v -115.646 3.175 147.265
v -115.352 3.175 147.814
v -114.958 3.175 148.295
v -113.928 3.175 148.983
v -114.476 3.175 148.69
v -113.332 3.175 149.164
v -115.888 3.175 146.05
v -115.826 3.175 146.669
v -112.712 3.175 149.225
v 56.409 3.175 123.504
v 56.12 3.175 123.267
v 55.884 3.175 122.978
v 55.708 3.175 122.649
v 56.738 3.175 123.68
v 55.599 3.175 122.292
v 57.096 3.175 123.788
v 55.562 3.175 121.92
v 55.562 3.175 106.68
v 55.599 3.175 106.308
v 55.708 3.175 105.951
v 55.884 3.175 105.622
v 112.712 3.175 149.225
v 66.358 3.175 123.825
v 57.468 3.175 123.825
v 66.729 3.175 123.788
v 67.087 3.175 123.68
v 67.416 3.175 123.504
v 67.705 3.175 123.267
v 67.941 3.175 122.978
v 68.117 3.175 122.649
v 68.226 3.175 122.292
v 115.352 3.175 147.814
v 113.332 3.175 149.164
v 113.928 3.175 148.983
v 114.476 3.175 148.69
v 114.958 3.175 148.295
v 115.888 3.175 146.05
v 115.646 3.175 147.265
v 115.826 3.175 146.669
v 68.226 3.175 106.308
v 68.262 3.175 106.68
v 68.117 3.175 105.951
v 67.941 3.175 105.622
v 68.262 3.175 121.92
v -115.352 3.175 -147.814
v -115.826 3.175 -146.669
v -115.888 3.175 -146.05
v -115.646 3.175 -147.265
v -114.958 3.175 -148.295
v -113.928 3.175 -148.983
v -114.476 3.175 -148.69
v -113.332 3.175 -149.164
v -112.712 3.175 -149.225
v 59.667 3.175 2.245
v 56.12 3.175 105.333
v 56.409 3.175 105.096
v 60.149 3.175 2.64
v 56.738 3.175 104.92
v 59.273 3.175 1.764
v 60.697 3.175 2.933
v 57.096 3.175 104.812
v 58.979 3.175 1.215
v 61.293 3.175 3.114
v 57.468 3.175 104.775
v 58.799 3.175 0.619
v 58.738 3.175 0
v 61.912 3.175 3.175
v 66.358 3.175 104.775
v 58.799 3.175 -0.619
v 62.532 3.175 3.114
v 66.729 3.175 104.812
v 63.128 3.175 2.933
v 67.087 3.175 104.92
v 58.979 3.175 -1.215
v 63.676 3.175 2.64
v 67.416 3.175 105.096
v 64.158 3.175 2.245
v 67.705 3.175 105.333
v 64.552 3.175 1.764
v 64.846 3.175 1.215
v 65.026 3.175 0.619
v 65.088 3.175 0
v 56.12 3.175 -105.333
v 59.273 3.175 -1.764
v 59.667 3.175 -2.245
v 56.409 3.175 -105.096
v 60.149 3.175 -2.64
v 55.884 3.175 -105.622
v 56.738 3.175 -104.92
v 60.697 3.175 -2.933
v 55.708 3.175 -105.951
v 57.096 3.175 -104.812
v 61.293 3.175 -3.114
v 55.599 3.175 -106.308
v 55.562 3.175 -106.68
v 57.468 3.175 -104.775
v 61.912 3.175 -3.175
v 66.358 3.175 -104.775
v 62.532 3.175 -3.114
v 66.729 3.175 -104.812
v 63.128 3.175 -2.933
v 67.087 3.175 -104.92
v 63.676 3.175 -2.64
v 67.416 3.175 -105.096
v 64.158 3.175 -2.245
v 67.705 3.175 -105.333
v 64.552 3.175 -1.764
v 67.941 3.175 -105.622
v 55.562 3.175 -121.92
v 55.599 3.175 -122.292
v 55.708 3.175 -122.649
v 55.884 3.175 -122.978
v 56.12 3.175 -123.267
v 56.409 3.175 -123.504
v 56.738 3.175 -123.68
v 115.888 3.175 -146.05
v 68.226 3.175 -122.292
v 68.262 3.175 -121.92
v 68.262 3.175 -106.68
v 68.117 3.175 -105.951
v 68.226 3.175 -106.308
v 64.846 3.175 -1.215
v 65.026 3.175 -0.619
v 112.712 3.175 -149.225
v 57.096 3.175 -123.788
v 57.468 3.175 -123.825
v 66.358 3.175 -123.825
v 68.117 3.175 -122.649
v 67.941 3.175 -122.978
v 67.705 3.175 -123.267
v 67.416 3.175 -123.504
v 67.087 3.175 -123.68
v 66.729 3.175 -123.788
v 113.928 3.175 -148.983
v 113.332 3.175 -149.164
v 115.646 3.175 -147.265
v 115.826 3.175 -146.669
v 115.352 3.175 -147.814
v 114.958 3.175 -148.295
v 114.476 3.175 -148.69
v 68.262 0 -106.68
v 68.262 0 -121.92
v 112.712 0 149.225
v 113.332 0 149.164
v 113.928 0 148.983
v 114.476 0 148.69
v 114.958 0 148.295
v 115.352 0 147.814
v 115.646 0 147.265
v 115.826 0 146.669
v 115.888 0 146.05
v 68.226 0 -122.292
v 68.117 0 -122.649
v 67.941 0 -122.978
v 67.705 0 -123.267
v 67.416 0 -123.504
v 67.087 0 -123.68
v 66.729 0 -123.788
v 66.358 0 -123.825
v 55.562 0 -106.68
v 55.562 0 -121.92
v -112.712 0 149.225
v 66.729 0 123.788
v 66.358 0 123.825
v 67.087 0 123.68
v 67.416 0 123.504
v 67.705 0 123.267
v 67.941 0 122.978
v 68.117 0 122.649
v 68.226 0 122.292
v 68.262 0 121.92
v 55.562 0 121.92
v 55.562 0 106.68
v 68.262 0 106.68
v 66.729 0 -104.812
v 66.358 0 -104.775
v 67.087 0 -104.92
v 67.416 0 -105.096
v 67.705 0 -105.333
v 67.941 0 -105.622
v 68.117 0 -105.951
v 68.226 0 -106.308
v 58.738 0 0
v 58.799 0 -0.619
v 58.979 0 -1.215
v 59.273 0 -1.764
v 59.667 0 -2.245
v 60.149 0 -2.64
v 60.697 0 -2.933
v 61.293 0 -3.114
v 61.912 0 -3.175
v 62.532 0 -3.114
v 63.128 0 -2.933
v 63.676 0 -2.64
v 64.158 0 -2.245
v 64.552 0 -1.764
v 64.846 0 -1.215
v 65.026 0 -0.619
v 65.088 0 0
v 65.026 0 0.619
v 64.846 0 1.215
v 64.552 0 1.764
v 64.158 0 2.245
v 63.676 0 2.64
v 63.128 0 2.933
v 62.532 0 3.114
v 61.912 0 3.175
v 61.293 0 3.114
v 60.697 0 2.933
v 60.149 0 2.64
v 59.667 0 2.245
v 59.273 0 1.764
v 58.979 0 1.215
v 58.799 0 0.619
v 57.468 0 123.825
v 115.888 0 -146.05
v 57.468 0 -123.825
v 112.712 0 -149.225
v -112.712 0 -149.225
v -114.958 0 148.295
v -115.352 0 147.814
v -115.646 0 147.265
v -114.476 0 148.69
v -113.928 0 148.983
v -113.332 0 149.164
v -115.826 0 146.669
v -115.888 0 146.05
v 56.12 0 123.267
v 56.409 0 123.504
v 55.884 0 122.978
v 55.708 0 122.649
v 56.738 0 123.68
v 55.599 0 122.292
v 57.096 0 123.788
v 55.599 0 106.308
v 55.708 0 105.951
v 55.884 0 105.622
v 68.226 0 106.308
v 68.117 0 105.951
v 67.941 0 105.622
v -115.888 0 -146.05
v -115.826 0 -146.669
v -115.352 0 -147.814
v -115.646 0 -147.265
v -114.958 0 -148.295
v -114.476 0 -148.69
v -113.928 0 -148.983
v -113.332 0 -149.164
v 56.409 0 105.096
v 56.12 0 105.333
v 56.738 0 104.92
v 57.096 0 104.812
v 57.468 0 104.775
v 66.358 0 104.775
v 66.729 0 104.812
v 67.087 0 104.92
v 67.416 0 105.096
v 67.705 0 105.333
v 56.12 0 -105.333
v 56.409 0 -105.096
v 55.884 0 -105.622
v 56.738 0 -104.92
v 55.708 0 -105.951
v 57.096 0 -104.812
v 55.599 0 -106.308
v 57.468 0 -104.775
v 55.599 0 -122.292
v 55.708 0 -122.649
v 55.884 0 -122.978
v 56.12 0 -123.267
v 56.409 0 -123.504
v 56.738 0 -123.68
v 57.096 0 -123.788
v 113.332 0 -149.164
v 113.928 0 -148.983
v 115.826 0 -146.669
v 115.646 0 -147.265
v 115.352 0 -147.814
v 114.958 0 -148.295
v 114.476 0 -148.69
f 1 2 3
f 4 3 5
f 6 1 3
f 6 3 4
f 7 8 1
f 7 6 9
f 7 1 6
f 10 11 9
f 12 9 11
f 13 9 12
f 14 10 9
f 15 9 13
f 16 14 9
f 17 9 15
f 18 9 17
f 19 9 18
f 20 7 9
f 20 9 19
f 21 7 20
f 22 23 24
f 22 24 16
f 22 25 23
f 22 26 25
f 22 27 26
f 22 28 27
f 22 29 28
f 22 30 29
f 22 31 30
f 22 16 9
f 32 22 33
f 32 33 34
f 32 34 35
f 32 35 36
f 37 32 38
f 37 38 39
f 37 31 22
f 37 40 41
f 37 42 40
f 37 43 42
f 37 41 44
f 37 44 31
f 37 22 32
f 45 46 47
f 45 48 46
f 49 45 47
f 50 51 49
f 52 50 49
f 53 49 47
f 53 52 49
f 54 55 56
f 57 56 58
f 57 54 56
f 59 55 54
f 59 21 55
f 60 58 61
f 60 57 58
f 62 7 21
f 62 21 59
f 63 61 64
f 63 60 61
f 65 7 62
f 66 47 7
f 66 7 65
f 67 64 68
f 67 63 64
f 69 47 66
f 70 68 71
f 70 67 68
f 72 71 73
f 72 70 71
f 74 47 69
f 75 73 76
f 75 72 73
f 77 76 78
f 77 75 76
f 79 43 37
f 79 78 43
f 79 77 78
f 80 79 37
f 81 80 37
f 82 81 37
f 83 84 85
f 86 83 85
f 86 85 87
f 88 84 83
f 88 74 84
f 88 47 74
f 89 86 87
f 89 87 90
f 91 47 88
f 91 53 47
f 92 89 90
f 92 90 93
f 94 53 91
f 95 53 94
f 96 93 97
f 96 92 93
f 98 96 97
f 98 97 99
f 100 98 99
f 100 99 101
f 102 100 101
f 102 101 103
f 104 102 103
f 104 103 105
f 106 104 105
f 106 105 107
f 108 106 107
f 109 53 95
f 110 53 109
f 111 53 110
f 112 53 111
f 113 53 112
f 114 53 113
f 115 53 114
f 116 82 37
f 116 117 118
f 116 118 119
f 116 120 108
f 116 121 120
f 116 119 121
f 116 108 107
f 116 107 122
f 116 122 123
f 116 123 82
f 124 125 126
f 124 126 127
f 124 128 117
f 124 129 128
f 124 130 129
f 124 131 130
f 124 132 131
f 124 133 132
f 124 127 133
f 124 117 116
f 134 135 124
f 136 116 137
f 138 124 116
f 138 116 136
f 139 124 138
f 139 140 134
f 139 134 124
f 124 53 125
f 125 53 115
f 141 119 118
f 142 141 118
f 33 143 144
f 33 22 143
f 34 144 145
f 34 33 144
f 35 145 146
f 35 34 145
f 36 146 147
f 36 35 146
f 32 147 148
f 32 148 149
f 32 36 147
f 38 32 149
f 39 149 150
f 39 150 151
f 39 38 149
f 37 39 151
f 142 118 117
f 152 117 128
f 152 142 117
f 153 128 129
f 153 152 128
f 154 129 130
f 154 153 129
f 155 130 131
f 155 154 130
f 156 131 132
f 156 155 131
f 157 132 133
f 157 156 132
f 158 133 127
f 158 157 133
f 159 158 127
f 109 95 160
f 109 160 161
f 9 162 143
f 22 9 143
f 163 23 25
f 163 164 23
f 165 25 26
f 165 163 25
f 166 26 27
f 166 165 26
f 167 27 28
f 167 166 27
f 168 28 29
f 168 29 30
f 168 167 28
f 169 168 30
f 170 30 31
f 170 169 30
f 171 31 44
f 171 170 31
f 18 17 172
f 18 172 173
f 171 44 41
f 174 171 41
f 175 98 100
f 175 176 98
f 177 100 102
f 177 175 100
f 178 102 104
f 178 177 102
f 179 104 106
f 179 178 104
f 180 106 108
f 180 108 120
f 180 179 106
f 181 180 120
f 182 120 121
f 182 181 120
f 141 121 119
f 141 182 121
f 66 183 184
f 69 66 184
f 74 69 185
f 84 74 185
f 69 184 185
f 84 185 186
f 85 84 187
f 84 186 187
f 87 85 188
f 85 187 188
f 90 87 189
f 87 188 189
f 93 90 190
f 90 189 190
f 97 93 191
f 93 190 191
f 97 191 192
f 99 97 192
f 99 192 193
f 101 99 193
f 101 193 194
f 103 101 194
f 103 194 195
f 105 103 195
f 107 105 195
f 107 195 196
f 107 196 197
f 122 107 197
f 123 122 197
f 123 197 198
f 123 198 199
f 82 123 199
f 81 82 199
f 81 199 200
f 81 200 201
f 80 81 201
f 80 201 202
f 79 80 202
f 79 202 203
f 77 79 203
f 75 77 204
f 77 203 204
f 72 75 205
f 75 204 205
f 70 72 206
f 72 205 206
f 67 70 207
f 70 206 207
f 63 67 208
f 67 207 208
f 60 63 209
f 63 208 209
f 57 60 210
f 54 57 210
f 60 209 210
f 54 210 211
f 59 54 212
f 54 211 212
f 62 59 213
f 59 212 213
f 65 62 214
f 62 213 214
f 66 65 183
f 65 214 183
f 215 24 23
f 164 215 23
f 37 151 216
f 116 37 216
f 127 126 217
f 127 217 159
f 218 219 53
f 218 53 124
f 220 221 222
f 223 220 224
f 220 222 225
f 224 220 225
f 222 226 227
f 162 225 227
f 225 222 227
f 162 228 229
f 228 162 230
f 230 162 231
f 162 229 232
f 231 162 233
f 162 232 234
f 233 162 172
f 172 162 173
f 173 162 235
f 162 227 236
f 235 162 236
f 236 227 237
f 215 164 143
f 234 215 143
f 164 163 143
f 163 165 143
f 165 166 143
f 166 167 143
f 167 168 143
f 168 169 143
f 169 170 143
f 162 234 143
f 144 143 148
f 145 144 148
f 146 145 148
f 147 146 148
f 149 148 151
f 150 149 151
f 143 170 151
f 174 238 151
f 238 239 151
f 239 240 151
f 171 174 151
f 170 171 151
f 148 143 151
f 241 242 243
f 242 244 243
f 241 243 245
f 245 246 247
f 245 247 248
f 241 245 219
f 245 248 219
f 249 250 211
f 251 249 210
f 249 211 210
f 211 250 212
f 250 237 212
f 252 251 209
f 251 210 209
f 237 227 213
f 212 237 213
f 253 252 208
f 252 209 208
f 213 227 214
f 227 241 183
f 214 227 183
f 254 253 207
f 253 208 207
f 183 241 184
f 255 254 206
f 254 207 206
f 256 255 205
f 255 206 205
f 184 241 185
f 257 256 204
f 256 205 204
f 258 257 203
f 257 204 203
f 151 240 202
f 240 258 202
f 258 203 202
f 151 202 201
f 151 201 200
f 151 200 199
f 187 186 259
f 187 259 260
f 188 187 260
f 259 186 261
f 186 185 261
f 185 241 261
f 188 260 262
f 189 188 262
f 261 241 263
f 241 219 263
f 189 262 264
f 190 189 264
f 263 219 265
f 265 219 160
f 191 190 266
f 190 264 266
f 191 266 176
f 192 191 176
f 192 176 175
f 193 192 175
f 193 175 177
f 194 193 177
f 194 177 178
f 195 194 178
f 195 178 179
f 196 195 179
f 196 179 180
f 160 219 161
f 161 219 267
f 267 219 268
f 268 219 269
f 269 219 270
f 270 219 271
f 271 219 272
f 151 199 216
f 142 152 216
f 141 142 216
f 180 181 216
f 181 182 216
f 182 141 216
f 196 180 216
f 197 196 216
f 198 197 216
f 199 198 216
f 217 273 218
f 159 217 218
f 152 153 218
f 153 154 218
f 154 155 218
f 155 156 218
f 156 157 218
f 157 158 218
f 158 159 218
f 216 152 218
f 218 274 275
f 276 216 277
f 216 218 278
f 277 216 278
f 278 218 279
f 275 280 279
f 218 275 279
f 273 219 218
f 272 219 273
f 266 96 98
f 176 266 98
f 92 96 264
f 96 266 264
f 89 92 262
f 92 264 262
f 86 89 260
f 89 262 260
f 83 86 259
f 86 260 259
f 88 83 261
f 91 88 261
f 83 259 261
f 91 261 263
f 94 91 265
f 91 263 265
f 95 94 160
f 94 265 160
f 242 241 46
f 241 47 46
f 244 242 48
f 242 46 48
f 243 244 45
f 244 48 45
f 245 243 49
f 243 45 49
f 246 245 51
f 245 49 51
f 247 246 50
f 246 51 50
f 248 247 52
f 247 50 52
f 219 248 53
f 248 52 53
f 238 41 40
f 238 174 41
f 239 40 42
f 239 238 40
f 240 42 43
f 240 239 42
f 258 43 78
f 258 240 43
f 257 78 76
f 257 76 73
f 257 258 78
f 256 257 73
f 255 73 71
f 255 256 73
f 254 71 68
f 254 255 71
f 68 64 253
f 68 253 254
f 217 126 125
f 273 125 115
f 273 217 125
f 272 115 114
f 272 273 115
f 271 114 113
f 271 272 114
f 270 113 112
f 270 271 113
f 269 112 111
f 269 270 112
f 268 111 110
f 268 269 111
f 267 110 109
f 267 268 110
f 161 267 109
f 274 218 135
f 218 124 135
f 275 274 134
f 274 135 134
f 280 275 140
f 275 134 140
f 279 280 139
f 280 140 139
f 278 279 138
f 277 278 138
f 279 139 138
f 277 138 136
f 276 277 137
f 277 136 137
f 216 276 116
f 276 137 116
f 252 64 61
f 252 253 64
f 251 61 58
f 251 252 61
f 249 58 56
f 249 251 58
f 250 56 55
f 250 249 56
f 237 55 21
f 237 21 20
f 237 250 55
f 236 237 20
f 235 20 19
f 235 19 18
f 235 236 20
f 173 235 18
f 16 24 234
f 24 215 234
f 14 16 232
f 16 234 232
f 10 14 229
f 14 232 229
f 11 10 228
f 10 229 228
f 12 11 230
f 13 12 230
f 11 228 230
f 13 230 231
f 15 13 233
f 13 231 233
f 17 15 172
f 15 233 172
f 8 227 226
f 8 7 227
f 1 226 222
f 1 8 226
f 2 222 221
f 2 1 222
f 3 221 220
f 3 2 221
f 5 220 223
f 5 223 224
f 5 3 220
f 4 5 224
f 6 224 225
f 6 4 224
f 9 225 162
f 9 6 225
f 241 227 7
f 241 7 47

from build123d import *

# Parameters (mm, degrees)
SKETCH1_W                   = 231.775
SKETCH1_H                   = 298.45
BOSS_EXTRUDE1_DEPTH         = 3.175
F_1_4_0_25_DIAMETER_HOLE1_D = 6.35
FILLET1_R                   = 3.175
SKETCH4_W                   = 12.7
SKETCH4_H                   = 19.05
CUT_EXTRUDE1_DEPTH          = 4.175
FILLET2_R                   = 1.905


with BuildPart() as part:
    # Sketch1 → Boss-Extrude1 (new body)
    with BuildSketch(Plane(origin=(0, 0, 0), x_dir=(1, 0, 0), z_dir=(0, 1, 0))):
        Rectangle(SKETCH1_W, SKETCH1_H)
    extrude(amount=BOSS_EXTRUDE1_DEPTH)

    # 1/4 (0.25) Diameter Hole1 (through all)
    with Locations(Plane(origin=(0, 3.175, 0), x_dir=(1, 0, 0), z_dir=(0, 1, 0))):
        with Locations((61.9125, 0)):
            Hole(F_1_4_0_25_DIAMETER_HOLE1_D / 2)

    # Fillet1
    fillet1_edges = [part.edges().sort_by_distance(p)[0] for p in [
        (115.8875, 1.5875, 149.225),
        (-115.8875, 1.5875, 149.225),
        (-115.8875, 1.5875, -149.225),
        (115.8875, 1.5875, -149.225),
    ]]
    fillet(fillet1_edges, radius=FILLET1_R)

    # Sketch4 → Cut-Extrude1 (cut, through all)
    with BuildSketch(Plane(origin=(0, 3.175, 0), x_dir=(1, 0, 0), z_dir=(0, 1, 0))):
        with Locations((61.9125, -114.3)):
            Rectangle(SKETCH4_W, SKETCH4_H)
        with Locations((61.9125, 114.3)):
            Rectangle(SKETCH4_W, SKETCH4_H)
    extrude(amount=-CUT_EXTRUDE1_DEPTH, mode=Mode.SUBTRACT)

    # Fillet2
    fillet2_edges = [part.edges().sort_by_distance(p)[0] for p in [
        (55.5625, 1.5875, 123.825),
        (55.5625, 1.5875, 104.775),
        (68.2625, 1.5875, 104.775),
        (68.2625, 1.5875, 123.825),
        (55.5625, 1.5875, -104.775),
        (55.5625, 1.5875, -123.825),
        (68.2625, 1.5875, -123.825),
        (68.2625, 1.5875, -104.775),
    ]]
    fillet(fillet2_edges, radius=FILLET2_R)


solid = part.part
